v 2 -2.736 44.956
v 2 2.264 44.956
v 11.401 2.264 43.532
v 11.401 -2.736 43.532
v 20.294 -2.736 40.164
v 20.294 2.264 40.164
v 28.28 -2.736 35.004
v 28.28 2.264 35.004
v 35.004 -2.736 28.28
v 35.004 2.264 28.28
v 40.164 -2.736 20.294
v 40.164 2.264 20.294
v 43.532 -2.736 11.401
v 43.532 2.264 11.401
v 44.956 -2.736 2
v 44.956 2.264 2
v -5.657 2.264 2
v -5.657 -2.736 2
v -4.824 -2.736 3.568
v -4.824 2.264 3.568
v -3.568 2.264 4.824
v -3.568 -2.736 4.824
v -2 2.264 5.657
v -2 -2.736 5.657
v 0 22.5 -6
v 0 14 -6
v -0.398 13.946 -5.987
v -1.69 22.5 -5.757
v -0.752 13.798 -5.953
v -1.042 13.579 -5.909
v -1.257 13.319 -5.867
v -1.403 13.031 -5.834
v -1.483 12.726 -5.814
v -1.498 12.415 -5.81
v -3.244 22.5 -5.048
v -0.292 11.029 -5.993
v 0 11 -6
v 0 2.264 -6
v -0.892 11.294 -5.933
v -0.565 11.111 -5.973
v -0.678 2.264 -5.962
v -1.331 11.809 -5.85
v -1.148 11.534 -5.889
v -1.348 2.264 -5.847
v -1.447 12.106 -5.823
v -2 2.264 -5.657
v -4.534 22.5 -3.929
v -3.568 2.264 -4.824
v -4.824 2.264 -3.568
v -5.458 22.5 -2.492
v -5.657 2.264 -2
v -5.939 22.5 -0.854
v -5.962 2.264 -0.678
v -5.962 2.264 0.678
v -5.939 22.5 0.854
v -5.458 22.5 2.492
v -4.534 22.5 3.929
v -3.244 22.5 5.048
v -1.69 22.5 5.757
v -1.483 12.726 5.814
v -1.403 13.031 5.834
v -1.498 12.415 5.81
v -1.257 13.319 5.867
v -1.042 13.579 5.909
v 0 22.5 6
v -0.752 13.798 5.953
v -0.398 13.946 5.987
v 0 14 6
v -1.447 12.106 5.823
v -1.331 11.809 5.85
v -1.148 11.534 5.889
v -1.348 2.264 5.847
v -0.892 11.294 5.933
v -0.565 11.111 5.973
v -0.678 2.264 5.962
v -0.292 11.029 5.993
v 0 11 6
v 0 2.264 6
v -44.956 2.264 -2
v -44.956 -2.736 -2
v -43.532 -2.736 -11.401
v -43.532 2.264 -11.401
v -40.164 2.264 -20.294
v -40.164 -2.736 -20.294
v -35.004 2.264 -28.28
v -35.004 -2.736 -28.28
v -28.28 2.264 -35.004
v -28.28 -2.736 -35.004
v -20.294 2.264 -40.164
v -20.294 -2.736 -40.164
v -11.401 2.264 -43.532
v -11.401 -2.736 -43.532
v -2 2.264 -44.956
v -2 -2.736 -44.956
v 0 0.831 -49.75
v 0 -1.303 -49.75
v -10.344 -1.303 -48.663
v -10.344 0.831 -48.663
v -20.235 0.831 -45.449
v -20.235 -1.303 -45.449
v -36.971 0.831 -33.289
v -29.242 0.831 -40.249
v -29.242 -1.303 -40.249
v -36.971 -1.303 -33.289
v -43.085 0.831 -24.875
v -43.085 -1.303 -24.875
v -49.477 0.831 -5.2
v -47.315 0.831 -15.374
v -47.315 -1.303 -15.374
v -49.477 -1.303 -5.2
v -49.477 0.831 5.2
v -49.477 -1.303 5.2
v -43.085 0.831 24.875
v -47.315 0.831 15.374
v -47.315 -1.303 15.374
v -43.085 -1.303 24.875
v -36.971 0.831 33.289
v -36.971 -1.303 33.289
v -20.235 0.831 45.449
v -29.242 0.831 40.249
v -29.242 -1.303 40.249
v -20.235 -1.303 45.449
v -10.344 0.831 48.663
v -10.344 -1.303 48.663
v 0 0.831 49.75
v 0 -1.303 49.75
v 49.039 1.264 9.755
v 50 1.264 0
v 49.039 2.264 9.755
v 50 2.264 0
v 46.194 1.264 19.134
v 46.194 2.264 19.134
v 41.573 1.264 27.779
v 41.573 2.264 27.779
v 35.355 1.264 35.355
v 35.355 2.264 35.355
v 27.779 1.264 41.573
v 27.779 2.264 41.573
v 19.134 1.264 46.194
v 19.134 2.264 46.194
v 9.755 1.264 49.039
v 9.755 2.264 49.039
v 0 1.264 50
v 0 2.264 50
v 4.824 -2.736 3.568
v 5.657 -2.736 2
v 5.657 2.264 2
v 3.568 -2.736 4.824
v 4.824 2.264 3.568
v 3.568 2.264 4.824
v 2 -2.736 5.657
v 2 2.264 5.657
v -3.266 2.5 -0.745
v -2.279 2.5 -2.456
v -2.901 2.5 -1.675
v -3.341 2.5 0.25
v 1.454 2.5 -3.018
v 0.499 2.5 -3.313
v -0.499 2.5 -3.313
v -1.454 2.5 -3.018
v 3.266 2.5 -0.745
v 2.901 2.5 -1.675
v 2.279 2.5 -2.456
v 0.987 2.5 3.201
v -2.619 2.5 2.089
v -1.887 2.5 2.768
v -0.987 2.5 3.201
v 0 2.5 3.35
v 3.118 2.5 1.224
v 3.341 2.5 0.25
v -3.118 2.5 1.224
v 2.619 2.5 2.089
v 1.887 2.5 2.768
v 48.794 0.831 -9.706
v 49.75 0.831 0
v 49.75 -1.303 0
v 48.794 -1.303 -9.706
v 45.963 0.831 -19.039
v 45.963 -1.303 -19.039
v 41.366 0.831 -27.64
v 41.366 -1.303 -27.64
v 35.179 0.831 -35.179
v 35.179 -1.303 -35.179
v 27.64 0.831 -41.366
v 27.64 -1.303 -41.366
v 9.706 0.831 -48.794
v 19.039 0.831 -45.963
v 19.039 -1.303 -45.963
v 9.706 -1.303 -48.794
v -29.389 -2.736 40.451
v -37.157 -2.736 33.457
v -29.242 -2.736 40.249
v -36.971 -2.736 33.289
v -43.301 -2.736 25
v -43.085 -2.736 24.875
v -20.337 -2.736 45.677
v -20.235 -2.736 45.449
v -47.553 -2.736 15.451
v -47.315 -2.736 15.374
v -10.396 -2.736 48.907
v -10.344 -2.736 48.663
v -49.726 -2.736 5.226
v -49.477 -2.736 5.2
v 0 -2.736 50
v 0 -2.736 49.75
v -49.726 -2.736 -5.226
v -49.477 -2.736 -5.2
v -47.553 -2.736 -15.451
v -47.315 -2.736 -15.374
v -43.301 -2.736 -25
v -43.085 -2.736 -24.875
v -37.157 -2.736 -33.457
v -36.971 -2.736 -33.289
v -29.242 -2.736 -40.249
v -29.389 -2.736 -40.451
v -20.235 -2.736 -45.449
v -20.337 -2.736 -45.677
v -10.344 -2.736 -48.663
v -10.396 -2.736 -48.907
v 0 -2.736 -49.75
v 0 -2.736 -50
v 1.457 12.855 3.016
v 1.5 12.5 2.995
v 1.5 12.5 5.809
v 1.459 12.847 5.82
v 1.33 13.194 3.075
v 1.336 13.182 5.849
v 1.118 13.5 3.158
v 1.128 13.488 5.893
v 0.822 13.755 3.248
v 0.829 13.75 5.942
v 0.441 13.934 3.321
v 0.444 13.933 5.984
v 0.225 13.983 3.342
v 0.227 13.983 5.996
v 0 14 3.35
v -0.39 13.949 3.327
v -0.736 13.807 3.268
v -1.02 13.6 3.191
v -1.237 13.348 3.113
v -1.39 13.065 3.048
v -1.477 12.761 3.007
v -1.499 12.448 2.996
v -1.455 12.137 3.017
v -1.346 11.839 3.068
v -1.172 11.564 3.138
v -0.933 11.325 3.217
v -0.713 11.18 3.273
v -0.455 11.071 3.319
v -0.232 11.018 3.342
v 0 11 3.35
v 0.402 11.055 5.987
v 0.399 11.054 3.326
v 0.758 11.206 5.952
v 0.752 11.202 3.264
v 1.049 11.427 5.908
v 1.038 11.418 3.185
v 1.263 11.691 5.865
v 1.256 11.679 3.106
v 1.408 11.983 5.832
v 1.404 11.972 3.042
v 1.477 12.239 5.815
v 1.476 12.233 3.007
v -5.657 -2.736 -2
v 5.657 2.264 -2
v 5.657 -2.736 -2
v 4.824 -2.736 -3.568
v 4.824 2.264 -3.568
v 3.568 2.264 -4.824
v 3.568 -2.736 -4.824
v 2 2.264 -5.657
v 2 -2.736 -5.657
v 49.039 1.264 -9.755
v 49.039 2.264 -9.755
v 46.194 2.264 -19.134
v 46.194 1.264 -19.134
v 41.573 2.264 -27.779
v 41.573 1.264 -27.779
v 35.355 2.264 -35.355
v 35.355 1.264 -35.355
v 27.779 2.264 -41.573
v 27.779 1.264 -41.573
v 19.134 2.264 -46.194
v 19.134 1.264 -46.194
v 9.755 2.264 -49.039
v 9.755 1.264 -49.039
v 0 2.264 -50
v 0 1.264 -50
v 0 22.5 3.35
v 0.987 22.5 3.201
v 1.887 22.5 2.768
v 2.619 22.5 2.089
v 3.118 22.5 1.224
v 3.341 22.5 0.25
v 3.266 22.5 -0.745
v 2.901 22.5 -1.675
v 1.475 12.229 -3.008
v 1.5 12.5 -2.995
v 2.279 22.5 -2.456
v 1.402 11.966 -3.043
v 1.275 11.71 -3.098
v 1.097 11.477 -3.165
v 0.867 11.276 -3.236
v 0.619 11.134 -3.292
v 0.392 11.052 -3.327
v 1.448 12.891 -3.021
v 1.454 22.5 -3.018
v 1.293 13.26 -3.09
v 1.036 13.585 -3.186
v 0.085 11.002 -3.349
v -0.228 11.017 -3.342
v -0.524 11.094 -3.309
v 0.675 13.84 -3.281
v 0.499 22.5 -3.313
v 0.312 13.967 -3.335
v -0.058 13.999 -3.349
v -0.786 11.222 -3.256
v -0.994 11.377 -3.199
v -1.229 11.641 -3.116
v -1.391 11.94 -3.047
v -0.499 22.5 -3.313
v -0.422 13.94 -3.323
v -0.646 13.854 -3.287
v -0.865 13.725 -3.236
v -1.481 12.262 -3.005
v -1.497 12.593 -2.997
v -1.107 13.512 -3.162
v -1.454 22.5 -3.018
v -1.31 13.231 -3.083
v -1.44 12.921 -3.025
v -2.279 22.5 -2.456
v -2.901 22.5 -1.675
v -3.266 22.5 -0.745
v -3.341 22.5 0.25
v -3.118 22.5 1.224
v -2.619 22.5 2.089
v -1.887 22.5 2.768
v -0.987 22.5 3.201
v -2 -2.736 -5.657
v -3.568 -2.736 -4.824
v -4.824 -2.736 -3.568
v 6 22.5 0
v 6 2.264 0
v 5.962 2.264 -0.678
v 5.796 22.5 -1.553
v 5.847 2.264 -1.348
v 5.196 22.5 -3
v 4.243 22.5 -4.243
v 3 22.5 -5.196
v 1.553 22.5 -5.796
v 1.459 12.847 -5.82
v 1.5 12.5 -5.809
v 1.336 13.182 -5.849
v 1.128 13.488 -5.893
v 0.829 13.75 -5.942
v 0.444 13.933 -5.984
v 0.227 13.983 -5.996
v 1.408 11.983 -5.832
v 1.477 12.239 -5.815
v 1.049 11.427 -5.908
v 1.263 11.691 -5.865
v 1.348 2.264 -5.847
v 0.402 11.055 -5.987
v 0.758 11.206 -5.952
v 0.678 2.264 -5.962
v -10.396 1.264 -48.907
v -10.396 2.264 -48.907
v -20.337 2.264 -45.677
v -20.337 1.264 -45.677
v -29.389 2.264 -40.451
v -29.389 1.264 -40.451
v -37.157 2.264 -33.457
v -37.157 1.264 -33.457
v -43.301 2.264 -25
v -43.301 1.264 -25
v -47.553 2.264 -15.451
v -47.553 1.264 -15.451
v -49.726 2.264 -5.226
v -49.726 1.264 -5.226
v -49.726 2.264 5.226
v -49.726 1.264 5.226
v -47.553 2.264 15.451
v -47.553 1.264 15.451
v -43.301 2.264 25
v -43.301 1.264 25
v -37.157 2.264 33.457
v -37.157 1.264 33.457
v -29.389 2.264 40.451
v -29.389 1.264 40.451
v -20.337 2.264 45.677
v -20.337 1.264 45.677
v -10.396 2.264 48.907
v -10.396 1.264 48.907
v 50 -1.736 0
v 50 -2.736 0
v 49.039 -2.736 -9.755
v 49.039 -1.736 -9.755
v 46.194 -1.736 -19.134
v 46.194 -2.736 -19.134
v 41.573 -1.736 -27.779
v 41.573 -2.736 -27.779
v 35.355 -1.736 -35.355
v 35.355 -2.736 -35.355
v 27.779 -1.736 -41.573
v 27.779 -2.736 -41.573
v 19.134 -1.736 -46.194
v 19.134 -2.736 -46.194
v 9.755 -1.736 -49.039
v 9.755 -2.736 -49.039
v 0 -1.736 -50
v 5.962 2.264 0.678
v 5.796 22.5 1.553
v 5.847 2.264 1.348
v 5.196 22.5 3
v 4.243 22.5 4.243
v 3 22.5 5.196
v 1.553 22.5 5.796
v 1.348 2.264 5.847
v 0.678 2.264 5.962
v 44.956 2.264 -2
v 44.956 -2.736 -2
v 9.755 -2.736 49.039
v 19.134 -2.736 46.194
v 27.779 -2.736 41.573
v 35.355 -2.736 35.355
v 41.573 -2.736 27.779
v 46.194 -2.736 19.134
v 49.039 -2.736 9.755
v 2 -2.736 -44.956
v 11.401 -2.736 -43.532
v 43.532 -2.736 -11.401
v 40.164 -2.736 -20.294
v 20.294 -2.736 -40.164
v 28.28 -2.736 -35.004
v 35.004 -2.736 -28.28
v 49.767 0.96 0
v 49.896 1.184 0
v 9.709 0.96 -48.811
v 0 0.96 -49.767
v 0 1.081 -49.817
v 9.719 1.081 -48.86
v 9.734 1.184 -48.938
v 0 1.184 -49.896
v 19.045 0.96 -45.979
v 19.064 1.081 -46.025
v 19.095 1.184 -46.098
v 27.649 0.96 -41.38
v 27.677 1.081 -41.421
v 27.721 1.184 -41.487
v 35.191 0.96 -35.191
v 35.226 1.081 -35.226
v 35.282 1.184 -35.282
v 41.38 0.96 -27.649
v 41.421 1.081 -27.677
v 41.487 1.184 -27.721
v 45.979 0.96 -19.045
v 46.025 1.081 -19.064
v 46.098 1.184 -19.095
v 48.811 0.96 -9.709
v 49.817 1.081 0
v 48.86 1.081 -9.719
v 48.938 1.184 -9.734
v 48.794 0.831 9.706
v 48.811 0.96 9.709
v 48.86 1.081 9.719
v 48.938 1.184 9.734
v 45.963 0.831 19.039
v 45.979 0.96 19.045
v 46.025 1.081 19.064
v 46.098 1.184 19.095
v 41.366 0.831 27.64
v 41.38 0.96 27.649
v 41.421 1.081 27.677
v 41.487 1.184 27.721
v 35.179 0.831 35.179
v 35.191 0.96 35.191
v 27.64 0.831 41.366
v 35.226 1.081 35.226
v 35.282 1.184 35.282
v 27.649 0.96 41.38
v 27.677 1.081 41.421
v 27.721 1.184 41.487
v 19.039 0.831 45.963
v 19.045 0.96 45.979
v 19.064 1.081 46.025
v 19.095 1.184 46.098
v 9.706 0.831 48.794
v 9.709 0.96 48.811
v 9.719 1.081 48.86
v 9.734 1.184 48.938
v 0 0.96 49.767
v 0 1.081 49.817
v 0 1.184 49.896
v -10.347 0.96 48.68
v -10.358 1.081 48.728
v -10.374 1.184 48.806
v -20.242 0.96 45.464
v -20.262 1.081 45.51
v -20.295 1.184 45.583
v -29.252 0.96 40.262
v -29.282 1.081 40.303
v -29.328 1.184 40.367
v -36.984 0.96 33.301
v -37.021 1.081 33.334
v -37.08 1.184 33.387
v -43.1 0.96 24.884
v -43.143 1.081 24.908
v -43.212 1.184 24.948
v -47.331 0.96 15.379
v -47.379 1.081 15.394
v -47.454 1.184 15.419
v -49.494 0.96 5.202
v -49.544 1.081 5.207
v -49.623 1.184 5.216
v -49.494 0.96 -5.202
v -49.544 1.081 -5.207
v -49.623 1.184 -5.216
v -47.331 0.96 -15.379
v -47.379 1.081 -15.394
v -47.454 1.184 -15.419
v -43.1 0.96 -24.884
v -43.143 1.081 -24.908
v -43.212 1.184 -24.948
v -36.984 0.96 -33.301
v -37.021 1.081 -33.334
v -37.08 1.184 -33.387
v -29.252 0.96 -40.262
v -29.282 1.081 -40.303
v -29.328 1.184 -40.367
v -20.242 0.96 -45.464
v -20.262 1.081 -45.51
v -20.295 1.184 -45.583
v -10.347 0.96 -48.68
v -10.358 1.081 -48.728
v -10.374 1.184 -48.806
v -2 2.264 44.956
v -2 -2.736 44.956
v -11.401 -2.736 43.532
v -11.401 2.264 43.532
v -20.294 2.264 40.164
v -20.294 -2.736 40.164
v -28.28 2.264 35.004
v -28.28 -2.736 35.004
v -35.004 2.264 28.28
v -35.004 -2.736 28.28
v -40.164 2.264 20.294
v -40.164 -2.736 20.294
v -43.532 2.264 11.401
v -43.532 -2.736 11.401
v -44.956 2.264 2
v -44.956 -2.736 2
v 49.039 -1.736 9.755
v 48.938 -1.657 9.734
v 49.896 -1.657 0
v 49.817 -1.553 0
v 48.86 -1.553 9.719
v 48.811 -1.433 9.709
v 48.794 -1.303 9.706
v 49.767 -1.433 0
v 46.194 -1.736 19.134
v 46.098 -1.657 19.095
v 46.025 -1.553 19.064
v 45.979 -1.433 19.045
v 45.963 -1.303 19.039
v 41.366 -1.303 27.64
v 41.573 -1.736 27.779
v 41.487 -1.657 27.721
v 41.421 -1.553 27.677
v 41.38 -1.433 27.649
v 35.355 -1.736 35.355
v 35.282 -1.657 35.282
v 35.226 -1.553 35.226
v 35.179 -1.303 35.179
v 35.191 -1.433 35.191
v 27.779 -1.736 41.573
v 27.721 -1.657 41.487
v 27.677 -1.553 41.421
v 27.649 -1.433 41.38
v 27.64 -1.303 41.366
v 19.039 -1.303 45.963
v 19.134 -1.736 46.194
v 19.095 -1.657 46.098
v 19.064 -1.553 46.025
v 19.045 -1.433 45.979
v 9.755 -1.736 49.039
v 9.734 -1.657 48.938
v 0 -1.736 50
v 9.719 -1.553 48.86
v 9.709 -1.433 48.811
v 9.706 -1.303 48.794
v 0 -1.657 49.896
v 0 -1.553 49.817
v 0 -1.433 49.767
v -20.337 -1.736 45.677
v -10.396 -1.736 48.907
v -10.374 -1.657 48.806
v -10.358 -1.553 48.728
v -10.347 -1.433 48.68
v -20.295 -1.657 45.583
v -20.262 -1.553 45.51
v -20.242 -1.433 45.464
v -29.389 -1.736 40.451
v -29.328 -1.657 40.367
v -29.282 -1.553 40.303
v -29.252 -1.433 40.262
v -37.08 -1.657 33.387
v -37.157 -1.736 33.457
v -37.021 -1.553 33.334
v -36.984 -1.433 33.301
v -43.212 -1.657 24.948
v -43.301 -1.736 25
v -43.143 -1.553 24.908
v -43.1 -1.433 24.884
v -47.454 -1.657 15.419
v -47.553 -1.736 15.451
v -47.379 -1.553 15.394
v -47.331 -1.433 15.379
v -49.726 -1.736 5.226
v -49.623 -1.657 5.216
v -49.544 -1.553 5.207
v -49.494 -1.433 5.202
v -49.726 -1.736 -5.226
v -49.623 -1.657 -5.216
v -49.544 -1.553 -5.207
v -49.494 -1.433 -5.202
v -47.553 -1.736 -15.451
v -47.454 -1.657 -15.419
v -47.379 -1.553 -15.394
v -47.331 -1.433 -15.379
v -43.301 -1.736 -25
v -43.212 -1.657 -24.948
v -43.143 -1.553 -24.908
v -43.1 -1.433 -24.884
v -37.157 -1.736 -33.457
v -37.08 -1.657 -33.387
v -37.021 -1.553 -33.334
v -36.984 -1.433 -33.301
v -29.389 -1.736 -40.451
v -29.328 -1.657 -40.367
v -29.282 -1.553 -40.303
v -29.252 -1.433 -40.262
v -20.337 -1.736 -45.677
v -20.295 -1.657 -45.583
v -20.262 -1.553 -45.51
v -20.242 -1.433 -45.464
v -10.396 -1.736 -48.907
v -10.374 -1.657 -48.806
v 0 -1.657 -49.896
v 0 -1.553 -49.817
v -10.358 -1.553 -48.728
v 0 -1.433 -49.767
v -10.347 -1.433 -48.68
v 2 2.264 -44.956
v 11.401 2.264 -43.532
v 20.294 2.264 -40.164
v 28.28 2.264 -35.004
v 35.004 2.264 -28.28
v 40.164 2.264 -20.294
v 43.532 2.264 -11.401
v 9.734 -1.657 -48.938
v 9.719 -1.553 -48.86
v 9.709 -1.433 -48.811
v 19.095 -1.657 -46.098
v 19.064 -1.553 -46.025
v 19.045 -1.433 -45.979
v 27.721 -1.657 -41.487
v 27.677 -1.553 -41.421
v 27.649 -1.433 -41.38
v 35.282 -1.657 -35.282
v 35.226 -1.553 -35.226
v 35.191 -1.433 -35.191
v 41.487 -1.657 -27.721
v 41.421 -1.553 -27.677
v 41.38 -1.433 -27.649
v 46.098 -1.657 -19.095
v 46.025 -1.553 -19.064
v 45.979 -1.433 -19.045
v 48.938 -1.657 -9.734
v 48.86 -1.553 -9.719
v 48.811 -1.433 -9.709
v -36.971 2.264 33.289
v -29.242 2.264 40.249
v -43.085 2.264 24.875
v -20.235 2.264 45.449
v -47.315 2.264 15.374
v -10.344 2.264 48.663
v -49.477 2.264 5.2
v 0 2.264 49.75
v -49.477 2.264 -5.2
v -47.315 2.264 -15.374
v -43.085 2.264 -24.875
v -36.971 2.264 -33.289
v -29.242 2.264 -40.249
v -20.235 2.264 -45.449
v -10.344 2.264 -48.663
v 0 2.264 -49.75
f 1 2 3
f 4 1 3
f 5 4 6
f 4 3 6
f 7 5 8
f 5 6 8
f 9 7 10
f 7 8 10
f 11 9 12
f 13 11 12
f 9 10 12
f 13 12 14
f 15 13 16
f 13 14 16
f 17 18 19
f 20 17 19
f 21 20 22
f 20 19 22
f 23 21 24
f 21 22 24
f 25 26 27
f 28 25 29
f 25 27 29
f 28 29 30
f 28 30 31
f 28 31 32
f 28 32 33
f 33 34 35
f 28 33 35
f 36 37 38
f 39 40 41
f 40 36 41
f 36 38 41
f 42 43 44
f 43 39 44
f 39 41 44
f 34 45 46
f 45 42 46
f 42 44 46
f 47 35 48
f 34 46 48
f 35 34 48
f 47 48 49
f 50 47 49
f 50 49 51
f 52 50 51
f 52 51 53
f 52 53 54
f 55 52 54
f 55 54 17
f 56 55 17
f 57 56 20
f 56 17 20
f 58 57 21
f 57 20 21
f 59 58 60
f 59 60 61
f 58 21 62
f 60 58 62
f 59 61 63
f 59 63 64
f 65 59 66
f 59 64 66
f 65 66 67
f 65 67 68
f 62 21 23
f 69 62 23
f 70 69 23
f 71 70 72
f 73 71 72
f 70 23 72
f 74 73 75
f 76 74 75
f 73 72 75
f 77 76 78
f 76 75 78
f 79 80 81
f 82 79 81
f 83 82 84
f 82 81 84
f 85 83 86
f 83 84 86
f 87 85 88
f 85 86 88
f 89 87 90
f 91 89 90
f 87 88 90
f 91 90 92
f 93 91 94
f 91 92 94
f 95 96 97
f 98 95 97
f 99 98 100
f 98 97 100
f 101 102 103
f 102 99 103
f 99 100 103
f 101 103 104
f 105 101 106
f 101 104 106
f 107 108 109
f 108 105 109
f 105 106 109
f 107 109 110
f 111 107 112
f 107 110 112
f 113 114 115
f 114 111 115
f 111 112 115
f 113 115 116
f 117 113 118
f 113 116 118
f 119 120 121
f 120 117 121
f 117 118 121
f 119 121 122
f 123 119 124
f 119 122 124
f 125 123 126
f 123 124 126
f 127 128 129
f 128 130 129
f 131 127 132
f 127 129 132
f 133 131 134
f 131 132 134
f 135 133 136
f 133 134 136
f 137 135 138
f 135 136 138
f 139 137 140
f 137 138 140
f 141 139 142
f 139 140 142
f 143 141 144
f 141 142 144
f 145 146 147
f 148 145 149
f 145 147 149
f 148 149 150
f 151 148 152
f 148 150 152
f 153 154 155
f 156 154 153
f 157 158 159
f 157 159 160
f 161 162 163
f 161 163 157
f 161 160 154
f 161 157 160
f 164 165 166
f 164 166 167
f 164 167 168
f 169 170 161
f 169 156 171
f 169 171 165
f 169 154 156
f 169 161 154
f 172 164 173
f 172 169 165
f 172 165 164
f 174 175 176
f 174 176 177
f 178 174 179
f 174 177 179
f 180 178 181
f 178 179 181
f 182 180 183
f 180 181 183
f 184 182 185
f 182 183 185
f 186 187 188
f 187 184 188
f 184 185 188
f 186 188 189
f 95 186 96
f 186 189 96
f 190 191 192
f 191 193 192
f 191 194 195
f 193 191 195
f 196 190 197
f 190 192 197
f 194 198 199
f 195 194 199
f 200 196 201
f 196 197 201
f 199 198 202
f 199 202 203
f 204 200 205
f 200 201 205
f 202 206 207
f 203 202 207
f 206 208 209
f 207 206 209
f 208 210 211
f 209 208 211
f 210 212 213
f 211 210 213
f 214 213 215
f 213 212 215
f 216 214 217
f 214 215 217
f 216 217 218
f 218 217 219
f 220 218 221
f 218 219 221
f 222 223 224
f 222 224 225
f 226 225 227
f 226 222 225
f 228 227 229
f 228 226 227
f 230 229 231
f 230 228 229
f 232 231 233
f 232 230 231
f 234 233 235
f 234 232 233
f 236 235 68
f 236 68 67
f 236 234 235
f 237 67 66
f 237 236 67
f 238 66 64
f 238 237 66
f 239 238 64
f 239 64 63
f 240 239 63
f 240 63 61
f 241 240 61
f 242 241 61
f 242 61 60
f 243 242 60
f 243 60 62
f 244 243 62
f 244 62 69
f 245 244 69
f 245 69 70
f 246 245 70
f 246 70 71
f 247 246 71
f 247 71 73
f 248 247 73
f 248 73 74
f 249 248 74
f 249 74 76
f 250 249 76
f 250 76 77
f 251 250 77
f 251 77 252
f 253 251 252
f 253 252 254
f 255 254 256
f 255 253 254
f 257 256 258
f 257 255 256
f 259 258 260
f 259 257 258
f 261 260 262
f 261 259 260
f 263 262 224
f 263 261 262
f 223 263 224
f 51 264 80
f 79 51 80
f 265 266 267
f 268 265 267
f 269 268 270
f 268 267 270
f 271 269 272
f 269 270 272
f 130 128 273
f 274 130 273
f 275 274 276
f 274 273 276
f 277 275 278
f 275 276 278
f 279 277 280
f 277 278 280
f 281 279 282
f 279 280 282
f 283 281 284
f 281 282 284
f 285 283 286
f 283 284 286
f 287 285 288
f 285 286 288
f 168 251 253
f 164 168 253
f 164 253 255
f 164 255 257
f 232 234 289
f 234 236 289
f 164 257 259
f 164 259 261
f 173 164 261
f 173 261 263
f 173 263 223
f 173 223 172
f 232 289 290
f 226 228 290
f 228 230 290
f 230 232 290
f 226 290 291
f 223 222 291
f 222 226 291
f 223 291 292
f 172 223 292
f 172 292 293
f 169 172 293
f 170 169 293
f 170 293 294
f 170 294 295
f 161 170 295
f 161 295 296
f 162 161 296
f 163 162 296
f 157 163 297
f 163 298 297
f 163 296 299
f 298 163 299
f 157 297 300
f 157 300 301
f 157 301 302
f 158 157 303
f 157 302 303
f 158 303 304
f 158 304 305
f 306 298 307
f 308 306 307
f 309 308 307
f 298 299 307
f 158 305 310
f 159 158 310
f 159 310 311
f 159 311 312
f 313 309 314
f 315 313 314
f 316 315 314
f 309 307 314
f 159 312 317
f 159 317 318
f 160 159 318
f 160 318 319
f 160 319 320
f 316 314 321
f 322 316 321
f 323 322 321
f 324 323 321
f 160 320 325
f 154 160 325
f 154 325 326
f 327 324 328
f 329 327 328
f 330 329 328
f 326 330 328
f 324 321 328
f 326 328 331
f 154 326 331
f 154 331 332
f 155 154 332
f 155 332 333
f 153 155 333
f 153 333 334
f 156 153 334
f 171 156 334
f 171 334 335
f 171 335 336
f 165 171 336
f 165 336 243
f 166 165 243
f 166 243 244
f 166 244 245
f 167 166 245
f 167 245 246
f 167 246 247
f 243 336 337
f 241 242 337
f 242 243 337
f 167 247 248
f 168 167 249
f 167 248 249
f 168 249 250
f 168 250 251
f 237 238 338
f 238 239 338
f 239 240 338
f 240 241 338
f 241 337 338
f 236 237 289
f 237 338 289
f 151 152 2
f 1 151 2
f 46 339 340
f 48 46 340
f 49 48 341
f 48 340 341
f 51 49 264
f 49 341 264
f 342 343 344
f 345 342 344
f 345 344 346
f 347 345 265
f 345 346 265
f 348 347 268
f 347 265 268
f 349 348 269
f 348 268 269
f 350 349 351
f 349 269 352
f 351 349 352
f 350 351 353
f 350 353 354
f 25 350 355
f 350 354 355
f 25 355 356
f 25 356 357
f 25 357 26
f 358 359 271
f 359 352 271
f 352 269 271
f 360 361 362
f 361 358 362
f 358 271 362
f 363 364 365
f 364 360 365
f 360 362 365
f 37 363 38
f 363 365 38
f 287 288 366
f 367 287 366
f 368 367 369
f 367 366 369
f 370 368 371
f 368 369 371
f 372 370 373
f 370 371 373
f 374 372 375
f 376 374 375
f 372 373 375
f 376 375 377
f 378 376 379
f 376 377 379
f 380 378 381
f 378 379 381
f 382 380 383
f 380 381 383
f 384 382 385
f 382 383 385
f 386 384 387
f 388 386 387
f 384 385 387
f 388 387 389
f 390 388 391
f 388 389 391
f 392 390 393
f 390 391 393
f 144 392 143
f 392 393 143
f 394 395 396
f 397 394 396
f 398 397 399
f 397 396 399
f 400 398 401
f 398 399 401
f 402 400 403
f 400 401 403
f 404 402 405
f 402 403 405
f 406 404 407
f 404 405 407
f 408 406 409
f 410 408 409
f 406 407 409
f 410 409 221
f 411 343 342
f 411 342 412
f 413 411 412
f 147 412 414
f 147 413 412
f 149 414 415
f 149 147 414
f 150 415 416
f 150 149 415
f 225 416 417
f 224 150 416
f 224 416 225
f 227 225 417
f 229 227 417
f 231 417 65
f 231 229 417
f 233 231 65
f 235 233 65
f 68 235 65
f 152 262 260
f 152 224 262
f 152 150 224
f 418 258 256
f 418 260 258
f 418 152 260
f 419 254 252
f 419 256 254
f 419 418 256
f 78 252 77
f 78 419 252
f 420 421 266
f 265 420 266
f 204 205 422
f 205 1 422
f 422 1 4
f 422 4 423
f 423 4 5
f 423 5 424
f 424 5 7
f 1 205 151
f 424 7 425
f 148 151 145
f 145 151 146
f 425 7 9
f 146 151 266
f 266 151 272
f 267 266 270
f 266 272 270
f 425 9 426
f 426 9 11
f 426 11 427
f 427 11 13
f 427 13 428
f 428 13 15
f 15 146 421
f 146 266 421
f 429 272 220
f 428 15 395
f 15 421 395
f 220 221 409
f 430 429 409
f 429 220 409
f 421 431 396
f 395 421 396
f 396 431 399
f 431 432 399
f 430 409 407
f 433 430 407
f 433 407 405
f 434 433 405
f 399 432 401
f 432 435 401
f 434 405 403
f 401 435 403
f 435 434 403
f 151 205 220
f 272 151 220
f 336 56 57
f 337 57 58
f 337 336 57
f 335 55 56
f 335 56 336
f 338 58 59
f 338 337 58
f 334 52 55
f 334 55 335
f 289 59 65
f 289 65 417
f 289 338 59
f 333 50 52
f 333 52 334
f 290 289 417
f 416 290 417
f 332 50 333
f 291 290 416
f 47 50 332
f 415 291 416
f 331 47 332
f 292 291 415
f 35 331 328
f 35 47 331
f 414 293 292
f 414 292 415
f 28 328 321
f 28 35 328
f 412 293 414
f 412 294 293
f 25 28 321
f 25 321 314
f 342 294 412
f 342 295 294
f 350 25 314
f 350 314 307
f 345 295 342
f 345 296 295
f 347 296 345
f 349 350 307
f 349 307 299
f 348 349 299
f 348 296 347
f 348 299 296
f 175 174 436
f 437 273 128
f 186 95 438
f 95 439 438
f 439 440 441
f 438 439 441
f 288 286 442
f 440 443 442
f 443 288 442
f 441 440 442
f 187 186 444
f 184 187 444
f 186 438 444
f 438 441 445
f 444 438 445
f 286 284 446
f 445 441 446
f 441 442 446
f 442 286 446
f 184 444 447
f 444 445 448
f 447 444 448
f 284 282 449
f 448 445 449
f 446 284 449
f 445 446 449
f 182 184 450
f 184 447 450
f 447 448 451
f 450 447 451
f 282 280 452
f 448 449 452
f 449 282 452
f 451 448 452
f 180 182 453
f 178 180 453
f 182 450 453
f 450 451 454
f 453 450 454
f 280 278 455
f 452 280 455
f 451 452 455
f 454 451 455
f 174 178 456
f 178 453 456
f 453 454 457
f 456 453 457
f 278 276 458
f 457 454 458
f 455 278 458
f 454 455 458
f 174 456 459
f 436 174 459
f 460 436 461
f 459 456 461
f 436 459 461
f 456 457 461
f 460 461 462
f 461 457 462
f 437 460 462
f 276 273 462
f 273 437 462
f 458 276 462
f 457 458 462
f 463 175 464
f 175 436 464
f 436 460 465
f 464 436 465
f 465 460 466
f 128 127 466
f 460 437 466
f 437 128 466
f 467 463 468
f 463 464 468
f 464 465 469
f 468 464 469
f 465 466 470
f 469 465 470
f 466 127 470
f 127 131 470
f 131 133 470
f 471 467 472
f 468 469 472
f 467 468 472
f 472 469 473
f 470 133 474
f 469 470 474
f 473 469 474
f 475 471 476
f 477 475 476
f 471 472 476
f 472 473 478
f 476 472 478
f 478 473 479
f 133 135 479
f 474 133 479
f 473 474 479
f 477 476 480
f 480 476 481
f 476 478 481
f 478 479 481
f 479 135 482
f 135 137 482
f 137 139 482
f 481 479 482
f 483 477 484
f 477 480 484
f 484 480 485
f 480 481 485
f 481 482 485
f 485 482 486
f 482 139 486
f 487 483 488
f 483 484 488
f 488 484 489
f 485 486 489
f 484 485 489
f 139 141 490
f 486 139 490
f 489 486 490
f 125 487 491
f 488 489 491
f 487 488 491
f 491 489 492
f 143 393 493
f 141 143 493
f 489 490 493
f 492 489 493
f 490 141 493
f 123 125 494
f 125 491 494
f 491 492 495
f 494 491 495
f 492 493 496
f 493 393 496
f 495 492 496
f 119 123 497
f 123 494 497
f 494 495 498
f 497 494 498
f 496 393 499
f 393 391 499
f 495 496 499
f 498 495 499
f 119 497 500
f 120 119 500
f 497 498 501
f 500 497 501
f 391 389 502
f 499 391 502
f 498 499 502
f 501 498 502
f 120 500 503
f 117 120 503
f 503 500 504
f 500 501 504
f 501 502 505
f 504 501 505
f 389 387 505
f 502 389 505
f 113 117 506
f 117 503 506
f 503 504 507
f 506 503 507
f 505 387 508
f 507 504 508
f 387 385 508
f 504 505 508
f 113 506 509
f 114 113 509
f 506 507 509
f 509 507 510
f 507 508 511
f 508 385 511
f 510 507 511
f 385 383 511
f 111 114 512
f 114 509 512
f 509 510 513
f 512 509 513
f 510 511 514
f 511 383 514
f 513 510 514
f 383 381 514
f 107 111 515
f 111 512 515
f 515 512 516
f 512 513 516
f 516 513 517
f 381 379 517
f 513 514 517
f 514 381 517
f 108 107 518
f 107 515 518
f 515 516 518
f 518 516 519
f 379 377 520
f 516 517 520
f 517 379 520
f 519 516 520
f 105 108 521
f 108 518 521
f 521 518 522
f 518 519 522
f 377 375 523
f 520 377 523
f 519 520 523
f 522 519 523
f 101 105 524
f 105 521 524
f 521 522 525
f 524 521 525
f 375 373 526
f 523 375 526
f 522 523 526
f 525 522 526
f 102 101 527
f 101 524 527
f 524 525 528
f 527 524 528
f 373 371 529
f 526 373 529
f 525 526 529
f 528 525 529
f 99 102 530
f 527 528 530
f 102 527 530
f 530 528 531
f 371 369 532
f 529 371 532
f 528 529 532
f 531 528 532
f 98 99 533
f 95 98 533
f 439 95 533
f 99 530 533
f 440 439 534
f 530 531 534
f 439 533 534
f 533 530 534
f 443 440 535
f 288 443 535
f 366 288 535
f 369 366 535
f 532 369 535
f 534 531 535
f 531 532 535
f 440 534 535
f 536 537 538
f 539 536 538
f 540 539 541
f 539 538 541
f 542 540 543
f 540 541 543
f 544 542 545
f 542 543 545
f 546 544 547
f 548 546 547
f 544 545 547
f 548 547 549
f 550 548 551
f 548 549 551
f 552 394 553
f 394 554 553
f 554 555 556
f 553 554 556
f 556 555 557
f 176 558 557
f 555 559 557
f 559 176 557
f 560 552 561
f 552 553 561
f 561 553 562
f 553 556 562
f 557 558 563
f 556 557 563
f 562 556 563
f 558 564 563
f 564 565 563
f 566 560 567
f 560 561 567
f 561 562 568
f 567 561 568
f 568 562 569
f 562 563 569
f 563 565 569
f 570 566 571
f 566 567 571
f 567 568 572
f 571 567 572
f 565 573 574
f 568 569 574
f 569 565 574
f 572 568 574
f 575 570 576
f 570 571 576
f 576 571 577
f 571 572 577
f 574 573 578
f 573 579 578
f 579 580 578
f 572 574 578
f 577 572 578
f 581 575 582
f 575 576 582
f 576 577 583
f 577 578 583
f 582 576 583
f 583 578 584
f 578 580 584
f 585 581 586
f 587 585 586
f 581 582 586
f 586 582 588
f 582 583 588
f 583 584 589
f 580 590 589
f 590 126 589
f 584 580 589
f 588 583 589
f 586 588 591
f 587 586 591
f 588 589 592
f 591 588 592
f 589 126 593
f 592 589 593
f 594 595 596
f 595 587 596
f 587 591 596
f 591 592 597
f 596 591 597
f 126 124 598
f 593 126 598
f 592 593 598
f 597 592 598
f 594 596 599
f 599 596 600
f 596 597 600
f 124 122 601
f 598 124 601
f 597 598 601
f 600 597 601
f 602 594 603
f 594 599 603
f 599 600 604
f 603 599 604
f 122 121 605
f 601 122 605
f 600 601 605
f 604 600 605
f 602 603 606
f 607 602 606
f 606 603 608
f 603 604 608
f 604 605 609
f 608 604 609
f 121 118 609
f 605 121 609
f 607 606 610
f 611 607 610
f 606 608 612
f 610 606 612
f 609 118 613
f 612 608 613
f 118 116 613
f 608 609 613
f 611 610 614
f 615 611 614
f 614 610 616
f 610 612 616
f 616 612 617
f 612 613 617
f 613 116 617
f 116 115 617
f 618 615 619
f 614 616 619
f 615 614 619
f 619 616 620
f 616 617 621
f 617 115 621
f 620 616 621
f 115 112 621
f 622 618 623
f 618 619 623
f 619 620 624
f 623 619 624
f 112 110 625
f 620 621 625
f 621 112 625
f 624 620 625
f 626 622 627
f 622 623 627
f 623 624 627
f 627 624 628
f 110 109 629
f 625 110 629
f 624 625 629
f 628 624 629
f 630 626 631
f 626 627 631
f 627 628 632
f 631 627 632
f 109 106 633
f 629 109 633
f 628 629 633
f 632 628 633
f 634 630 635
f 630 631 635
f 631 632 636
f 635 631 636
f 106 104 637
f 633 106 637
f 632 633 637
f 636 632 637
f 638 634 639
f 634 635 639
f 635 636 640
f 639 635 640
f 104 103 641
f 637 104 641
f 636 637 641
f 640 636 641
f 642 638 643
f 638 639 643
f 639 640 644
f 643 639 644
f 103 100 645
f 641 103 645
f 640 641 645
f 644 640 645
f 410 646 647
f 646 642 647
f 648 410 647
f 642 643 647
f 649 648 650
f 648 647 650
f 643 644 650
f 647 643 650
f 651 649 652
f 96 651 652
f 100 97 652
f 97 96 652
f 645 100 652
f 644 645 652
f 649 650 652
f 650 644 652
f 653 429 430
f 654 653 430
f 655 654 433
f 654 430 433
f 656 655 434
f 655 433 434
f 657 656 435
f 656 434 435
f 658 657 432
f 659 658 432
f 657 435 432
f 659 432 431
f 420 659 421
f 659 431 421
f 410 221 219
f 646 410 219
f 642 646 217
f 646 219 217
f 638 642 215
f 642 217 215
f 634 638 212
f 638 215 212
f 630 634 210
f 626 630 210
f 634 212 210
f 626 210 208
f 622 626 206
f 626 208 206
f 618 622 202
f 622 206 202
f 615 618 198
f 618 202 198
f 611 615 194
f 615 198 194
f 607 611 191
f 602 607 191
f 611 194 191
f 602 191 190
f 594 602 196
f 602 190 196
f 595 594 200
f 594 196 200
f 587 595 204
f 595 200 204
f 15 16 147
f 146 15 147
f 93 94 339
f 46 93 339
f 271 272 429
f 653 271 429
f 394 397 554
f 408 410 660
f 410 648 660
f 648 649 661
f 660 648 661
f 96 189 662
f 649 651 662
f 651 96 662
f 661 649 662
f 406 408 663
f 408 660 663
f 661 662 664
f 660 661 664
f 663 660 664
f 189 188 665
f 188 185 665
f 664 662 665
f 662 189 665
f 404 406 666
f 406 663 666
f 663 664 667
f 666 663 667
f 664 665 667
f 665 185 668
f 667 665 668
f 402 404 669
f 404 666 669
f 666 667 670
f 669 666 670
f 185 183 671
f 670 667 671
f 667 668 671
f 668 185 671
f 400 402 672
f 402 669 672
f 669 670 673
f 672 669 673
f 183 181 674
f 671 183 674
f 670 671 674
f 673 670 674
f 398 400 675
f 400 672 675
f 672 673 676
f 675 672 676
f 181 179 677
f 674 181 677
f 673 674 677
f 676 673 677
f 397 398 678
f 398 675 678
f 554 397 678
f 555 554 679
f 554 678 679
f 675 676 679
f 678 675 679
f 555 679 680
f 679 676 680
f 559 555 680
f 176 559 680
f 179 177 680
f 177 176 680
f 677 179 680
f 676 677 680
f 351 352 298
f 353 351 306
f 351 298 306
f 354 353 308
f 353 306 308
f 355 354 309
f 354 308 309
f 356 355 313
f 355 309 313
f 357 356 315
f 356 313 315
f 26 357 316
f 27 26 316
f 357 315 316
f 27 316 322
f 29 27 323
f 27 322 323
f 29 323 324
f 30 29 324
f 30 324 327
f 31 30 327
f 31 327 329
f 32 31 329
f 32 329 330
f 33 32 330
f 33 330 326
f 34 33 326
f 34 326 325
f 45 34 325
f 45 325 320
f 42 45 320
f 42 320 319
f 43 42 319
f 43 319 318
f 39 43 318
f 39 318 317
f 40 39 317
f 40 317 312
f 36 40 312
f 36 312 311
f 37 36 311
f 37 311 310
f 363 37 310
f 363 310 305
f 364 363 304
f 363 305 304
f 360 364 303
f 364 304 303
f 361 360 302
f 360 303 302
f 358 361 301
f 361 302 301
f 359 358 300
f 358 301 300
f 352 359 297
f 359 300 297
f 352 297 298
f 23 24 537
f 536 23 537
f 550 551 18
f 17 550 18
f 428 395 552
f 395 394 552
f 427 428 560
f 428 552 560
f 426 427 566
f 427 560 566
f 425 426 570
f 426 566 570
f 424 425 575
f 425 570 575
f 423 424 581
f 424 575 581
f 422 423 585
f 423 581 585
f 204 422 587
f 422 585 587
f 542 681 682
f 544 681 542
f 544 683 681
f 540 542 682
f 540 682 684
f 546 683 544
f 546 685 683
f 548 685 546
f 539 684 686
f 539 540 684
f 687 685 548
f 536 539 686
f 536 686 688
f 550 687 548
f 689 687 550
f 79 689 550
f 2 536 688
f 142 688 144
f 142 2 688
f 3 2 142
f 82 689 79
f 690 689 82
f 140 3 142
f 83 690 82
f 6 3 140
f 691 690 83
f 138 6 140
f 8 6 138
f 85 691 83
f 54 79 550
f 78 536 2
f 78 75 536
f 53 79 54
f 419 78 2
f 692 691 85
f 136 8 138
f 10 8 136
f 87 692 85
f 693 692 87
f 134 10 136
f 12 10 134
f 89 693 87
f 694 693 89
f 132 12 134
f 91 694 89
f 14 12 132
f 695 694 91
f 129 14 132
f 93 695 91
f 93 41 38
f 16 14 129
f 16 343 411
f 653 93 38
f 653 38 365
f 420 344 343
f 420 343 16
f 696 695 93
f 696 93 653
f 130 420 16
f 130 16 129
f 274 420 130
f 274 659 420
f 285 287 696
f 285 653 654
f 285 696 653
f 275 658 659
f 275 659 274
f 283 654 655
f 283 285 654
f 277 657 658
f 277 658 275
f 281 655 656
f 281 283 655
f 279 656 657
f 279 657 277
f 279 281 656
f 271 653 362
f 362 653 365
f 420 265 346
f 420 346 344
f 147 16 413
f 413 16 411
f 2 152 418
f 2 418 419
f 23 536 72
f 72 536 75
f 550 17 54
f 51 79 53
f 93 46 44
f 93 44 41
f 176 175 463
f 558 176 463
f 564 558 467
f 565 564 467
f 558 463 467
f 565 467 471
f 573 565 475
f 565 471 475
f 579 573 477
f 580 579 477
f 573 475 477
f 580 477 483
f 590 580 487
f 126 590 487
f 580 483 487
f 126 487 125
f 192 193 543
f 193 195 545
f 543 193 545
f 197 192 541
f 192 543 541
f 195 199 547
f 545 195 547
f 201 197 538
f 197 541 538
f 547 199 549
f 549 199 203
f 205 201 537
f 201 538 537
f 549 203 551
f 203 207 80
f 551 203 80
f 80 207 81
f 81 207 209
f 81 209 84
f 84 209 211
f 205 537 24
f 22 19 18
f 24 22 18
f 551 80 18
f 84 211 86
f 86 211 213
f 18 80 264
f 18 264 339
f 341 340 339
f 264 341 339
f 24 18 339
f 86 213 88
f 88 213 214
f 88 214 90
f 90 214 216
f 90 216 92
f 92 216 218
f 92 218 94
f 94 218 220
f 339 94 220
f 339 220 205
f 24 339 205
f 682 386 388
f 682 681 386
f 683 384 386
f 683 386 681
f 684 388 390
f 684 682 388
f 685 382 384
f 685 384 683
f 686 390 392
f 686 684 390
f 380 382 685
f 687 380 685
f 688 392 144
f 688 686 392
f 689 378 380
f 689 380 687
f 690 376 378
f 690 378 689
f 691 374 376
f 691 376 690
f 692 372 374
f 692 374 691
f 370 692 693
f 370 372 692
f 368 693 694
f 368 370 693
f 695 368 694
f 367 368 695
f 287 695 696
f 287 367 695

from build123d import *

# Parameters (mm, degrees)
REVOLVE1_ANGLE                 = 90
BOSS_EXTRUDE2_DEPTH            = 22.5
CUT_EXTRUDE1_DEPTH             = 74.549310272
MIRROR3_START                  = -2.736132077
MIRROR3_DEPTH                  = 5
MIRROR3_START_2                = 2.263867923
MIRROR3_2_DEPTH                = 20.236132077
MIRROR3_3_DEPTH                = 1
MIRROR3_START_3                = 1.263867923
MIRROR3_4_DEPTH                = 1
MIRROR4_START                  = -2.736132077
MIRROR4_DEPTH                  = 5
MIRROR4_START_2                = 2.263867923
MIRROR4_2_DEPTH                = 20.236132077
MIRROR4_3_DEPTH                = 1
MIRROR4_START_3                = 1.263867923
MIRROR4_4_DEPTH                = 1
SKETCH7_R                      = 3.35
CUT_EXTRUDE2_DEPTH             = 20
FILLET9_R                      = 0.5
CUT_EXTRUDE3_REACH             = 76.204
SKETCH8_R                      = 1.5
CUT_EXTRUDE3_DIRECTION_2_REACH = 76.204


# Read off the part's stored shape, not the designer's step: Mirror3, Mirror4
with BuildPart() as part:
    # Sketch1 → Revolve1 (revolve)
    with BuildSketch(Plane.XY):
        Polygon((0, 2.263867923), (0, -2.736132077), (50, -2.736132077), (50, -1.736132077), (49.75, -1.736132077), (49.75, 1.263867923), (50, 1.263867923), (50, 2.263867923), align=None)
    revolve(axis=Axis((0, 2.263867923, 0), (0, -1, 0)), revolution_arc=REVOLVE1_ANGLE)

    # Sketch2 → Boss-Extrude2 (add)
    with BuildSketch(Plane(origin=(0, 0, 0), x_dir=(1, 0, 0), z_dir=(0, 1, 0))):
        with BuildLine():
            Line((0, 0), (6, 0))
            ThreePointArc((6, 0), (4.242640687, -4.242640687), (0, -6))
            Line((0, -6), (0, 0))
        make_face()
    extrude(amount=BOSS_EXTRUDE2_DEPTH)

    # Sketch6 → Cut-Extrude1 (cut, through all)
    with BuildSketch(Plane(origin=(0, 2.263867923, 0), x_dir=(1, 0, 0), z_dir=(0, 1, 0))):
        with BuildLine():
            Line((2, -5.656854249), (2, -44.955533586))
            ThreePointArc((2, -44.955533586), (31.819805153, -31.819805153), (44.955533586, -2))
            Line((44.955533586, -2), (5.656854249, -2))
            ThreePointArc((5.656854249, -2), (4.242640687, -4.242640687), (2, -5.656854249))
        make_face()
    extrude(amount=-CUT_EXTRUDE1_DEPTH, mode=Mode.SUBTRACT)

    # Mirror3 outline → Mirror3 (add)
    with BuildSketch(Plane(origin=(0, 0, 0), x_dir=(1, 0, 0), z_dir=(0, 1, 0)).offset(MIRROR3_START)):
        with BuildLine():
            ThreePointArc((49.75, 0), (35.178562364, 35.178562364), (0, 49.75))
            Line((0, 49.75), (0, 0))
            Line((0, 0), (49.75, 0))
        make_face()
        with BuildLine():
            Line((44.955533586, 2), (5.656854249, 2))
            ThreePointArc((5.656854249, 2), (4.242640687, 4.242640687), (2, 5.656854249))
            Line((2, 5.656854249), (2, 44.955533586))
            ThreePointArc((2, 44.955533586), (31.819805153, 31.819805153), (44.955533586, 2))
        make_face(mode=Mode.SUBTRACT)
    extrude(amount=MIRROR3_DEPTH)

    # Mirror3 2 outline → Mirror3 2 (add)
    with BuildSketch(Plane(origin=(0, 0, 0), x_dir=(1, 0, 0), z_dir=(0, 1, 0)).offset(MIRROR3_START_2)):
        with BuildLine():
            Line((0, 0), (6, 0))
            ThreePointArc((6, 0), (4.242640687, 4.242640687), (0, 6))
            Line((0, 6), (0, 0))
        make_face()
    extrude(amount=MIRROR3_2_DEPTH)

    # Mirror3 3 outline → Mirror3 3 (add)
    with BuildSketch(Plane(origin=(0, 0, 0), x_dir=(1, 0, 0), z_dir=(0, 1, 0)).offset(MIRROR3_START)):
        with BuildLine():
            Line((49.75, 0), (50, 0))
            ThreePointArc((50, 0), (35.355339059, 35.355339059), (0, 50))
            Line((0, 50), (0, 49.75))
            ThreePointArc((0, 49.75), (35.178562364, 35.178562364), (49.75, 0))
        make_face()
    extrude(amount=MIRROR3_3_DEPTH)

    # Mirror3 4 outline → Mirror3 4 (add)
    with BuildSketch(Plane(origin=(0, 0, 0), x_dir=(1, 0, 0), z_dir=(0, 1, 0)).offset(MIRROR3_START_3)):
        with BuildLine():
            Line((49.75, 0), (50, 0))
            ThreePointArc((50, 0), (35.355339059, 35.355339059), (0, 50))
            Line((0, 50), (0, 49.75))
            ThreePointArc((0, 49.75), (35.178562364, 35.178562364), (49.75, 0))
        make_face()
    extrude(amount=MIRROR3_4_DEPTH)

    # Mirror4 outline → Mirror4 (add)
    with BuildSketch(Plane(origin=(0, 0, 0), x_dir=(1, 0, 0), z_dir=(0, 1, 0)).offset(MIRROR4_START)):
        with BuildLine():
            ThreePointArc((0, 49.75), (-49.75, 0), (0, -49.75))
            Line((0, -49.75), (0, 49.75))
        make_face()
        with BuildLine():
            Line((-2, 44.955533586), (-2, 5.656854249))
            ThreePointArc((-2, 5.656854249), (-4.242640687, 4.242640687), (-5.656854249, 2))
            Line((-5.656854249, 2), (-44.955533586, 2))
            ThreePointArc((-44.955533586, 2), (-31.819805153, 31.819805153), (-2, 44.955533586))
        make_face(mode=Mode.SUBTRACT)
        with BuildLine():
            Line((-44.955533586, -2), (-5.656854249, -2))
            ThreePointArc((-5.656854249, -2), (-4.242640687, -4.242640687), (-2, -5.656854249))
            Line((-2, -5.656854249), (-2, -44.955533586))
            ThreePointArc((-2, -44.955533586), (-31.819805153, -31.819805153), (-44.955533586, -2))
        make_face(mode=Mode.SUBTRACT)
    extrude(amount=MIRROR4_DEPTH)

    # Mirror4 2 outline → Mirror4 2 (add)
    with BuildSketch(Plane(origin=(0, 0, 0), x_dir=(1, 0, 0), z_dir=(0, 1, 0)).offset(MIRROR4_START_2)):
        with BuildLine():
            Line((0, -6), (0, 6))
            ThreePointArc((0, 6), (-6, 0), (0, -6))
        make_face()
    extrude(amount=MIRROR4_2_DEPTH)

    # Mirror4 3 outline → Mirror4 3 (add)
    with BuildSketch(Plane(origin=(0, 0, 0), x_dir=(1, 0, 0), z_dir=(0, 1, 0)).offset(MIRROR4_START)):
        with BuildLine():
            Line((0, 49.75), (0, 50))
            ThreePointArc((0, 50), (-50, 0), (0, -50))
            Line((0, -50), (0, -49.75))
            ThreePointArc((0, -49.75), (-49.75, 0), (0, 49.75))
        make_face()
    extrude(amount=MIRROR4_3_DEPTH)

    # Mirror4 4 outline → Mirror4 4 (add)
    with BuildSketch(Plane(origin=(0, 0, 0), x_dir=(1, 0, 0), z_dir=(0, 1, 0)).offset(MIRROR4_START_3)):
        with BuildLine():
            Line((0, 49.75), (0, 50))
            ThreePointArc((0, 50), (-50, 0), (0, -50))
            Line((0, -50), (0, -49.75))
            ThreePointArc((0, -49.75), (-49.75, 0), (0, 49.75))
        make_face()
    extrude(amount=MIRROR4_4_DEPTH)

    # Sketch7 → Cut-Extrude2 (cut)
    with BuildSketch(Plane(origin=(0, 22.5, 0), x_dir=(1, 0, 0), z_dir=(0, 1, 0))):
        with Locations(Location((0, 0, 0), (0, 0, 270))):
            Circle(SKETCH7_R)
    extrude(amount=-CUT_EXTRUDE2_DEPTH, mode=Mode.SUBTRACT)

    # Fillet9
    # the kernel refuses this fillet: 0.5 mm, written as the material it adds along each edge
    with BuildSketch(Plane(origin=(0, 1.263867923, 0), x_dir=(0, 0, 1), z_dir=(1, 0, 0))) as fillet9_piece_1:
        with BuildLine():
            CenterArc((50.25, 0.433012702), FILLET9_R, 180, 60)
            Line((50, 0), (49.995, -0.008660254))
            ThreePointArc((49.995, -0.008660254), (49.875, -0.01), (49.75, -0.01))
            Line((49.75, -0.01), (49.74, 0))
            Line((49.74, 0), (49.74, 0.433012702))
            Line((49.74, 0.433012702), (49.75, 0.433012702))
        make_face()
    revolve(axis=Axis((0, 1.263867923, 0), (0, -1, 0)), revolution_arc=180)
    with BuildSketch(Plane(origin=(0, -1.736132077, 0), x_dir=(0, 0, 1), z_dir=(1, 0, 0))) as fillet9_piece_2:
        with BuildLine():
            CenterArc((50.25, -0.433012702), FILLET9_R, 120, 60)
            Line((49.75, -0.433012702), (49.74, -0.433012702))
            Line((49.74, -0.433012702), (49.74, 0))
            Line((49.74, 0), (49.75, 0.01))
            ThreePointArc((49.75, 0.01), (49.875, 0.01), (49.995, 0.008660254))
            Line((49.995, 0.008660254), (50, 0))
        make_face()
    revolve(axis=Axis((0, -1.736132077, 0), (0, -1, 0)), revolution_arc=180)
    with BuildSketch(Plane(origin=(0, -1.736132077, 0), x_dir=(1, 0, 0), z_dir=(0, 0, -1))) as fillet9_piece_3:
        with BuildLine():
            CenterArc((50.25, -0.433012702), FILLET9_R, 120, 60)
            Line((49.75, -0.433012702), (49.74, -0.433012702))
            Line((49.74, -0.433012702), (49.74, 0))
            Line((49.74, 0), (49.75, 0.01))
            ThreePointArc((49.75, 0.01), (49.875, 0.01), (49.995, 0.008660254))
            Line((49.995, 0.008660254), (50, 0))
        make_face()
    revolve(axis=Axis((0, -1.736132077, 0), (0, -1, 0)), revolution_arc=90)
    with BuildSketch(Plane(origin=(0, -1.736132077, 0), x_dir=(2.109490694905436e-12, 0, -1.0), z_dir=(-1.0, 0, -2.109490694905436e-12))) as fillet9_piece_4:
        with BuildLine():
            CenterArc((50.25, -0.433012702), FILLET9_R, 120, 60)
            Line((49.75, -0.433012702), (49.74, -0.433012702))
            Line((49.74, -0.433012702), (49.74, 0))
            Line((49.74, 0), (49.75, 0.01))
            ThreePointArc((49.75, 0.01), (49.875, 0.01), (49.995, 0.008660254))
            Line((49.995, 0.008660254), (50, 0))
        make_face()
    revolve(axis=Axis((0, -1.736132077, 0), (0, -1, 0)), revolution_arc=90)
    with BuildSketch(Plane(origin=(0, 1.263867923, 0), x_dir=(1, 0, 0), z_dir=(0, 0, -1))) as fillet9_piece_5:
        with BuildLine():
            CenterArc((50.25, 0.433012702), FILLET9_R, 180, 60)
            Line((50, 0), (49.995, -0.008660254))
            ThreePointArc((49.995, -0.008660254), (49.875, -0.01), (49.75, -0.01))
            Line((49.75, -0.01), (49.74, 0))
            Line((49.74, 0), (49.74, 0.433012702))
            Line((49.74, 0.433012702), (49.75, 0.433012702))
        make_face()
    revolve(axis=Axis((0, 1.263867923, 0), (0, -1, 0)), revolution_arc=90)
    with BuildSketch(Plane(origin=(0, 1.263867923, 0), x_dir=(2.109490694905436e-12, 0, -1.0), z_dir=(-1.0, 0, -2.109490694905436e-12))) as fillet9_piece_6:
        with BuildLine():
            CenterArc((50.25, 0.433012702), FILLET9_R, 180, 60)
            Line((50, 0), (49.995, -0.008660254))
            ThreePointArc((49.995, -0.008660254), (49.875, -0.01), (49.75, -0.01))
            Line((49.75, -0.01), (49.74, 0))
            Line((49.74, 0), (49.74, 0.433012702))
            Line((49.74, 0.433012702), (49.75, 0.433012702))
        make_face()
    revolve(axis=Axis((0, 1.263867923, 0), (0, -1, 0)), revolution_arc=90)

    # Sketch8 → Cut-Extrude3 (cut, up to next)
    with BuildSketch(Plane.XY, mode=Mode.PRIVATE) as cut_extrude3_sk1:
        with Locations((0, 12.5)):
            Circle(SKETCH8_R)
    cut_extrude3_tool1 = extrude(cut_extrude3_sk1.sketch, amount=-CUT_EXTRUDE3_REACH, mode=Mode.PRIVATE) & part.part
    add(cut_extrude3_tool1.solids().sort_by_distance((0, 12.5, 0))[0], mode=Mode.SUBTRACT)

    # Sketch8 → Cut-Extrude3 direction 2 (cut, up to next)
    with BuildSketch(Plane.XY, mode=Mode.PRIVATE) as cut_extrude3_direction_2_sk1:
        with Locations((0, 12.5)):
            Circle(SKETCH8_R)
    cut_extrude3_direction_2_tool1 = extrude(cut_extrude3_direction_2_sk1.sketch, amount=CUT_EXTRUDE3_DIRECTION_2_REACH, mode=Mode.PRIVATE) & part.part
    add(cut_extrude3_direction_2_tool1.solids().sort_by_distance((0, 12.5, 0))[0], mode=Mode.SUBTRACT)


solid = part.part
